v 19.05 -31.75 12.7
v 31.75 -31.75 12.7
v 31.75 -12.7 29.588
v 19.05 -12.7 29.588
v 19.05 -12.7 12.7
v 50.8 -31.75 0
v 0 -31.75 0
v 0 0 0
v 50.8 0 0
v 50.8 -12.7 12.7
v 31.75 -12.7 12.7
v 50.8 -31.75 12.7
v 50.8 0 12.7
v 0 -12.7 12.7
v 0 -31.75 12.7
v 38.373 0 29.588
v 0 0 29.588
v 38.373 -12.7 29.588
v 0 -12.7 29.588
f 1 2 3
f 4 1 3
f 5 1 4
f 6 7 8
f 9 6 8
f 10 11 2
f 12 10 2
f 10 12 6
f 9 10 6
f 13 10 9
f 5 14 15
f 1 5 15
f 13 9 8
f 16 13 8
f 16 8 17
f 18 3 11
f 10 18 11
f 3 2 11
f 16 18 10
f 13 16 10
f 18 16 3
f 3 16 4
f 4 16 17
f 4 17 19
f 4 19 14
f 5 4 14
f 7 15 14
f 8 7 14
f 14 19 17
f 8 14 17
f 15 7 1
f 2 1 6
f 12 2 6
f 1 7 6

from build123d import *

# Parameters (mm, degrees)
F1_DEPTH = 50.8
F3_DEPTH = 25.4
F4_W     = 12.7
F4_H     = 19.05
F5_DEPTH = 17.018
F7_DEPTH = 25.4


with BuildPart() as f1:
    # F0 (on Right) → F1 (new body)
    with BuildSketch(Plane.YZ):
        Polygon((-31.75, 12.7), (-31.75, 0), (0, 0), (0, 29.588299), (-12.7, 29.588299), (-12.7, 12.7), align=None)
    extrude(amount=F1_DEPTH)

    # F2 (on face) → F3 (cut)
    with BuildSketch(Plane.XZ.offset(12.7)):
        Polygon((38.373474, 29.588299), (50.8, 12.7), (50.8, 29.588299), align=None)
    extrude(amount=-F3_DEPTH, mode=Mode.SUBTRACT)

    # F4 (on face) → F5 (join)
    with BuildSketch(Plane.XY.offset(12.7)):
        with Locations((25.4, -22.225)):
            Rectangle(F4_W, F4_H)
    extrude(amount=F5_DEPTH)

    # F6 (on face) → F7 (cut)
    with BuildSketch(Plane.YZ.offset(31.75)):
        Polygon((-31.75, 29.718), (-31.75, 12.7), (-12.7, 29.588299), (-12.7, 29.718), align=None)
    extrude(amount=-F7_DEPTH, mode=Mode.SUBTRACT)


solid = f1.part
